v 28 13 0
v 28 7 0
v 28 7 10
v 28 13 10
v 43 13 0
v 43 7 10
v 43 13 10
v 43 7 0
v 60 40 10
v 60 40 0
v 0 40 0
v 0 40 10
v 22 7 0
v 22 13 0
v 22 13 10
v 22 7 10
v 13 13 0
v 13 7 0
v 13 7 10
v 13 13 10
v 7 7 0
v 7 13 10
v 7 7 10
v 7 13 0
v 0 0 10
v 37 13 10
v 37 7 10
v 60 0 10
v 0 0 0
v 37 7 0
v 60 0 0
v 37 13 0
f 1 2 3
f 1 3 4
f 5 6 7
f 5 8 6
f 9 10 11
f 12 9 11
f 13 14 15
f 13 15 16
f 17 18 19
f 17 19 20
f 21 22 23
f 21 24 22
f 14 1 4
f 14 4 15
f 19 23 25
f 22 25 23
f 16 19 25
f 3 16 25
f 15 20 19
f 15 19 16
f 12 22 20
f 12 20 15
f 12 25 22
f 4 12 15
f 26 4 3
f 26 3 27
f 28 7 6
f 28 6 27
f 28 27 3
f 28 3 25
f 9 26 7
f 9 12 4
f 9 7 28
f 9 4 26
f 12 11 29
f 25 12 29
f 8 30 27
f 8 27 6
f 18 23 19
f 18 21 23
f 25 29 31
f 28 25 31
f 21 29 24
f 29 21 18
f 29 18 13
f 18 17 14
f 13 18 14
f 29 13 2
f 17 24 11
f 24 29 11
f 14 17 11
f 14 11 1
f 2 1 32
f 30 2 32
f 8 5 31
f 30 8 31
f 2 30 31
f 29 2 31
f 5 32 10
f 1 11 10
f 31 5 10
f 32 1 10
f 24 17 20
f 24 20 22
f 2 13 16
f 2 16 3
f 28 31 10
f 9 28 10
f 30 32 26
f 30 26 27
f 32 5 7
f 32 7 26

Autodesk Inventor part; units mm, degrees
ref_plane "YZ Plane" through (0, 0, 0) normal (1, 0, 0) x (0, 1, 0)
ref_plane "XZ Plane" through (0, 0, 0) normal (0, 1, 0) x (-1, 0, 0)
ref_plane "XY Plane" through (0, 0, 0) normal (0, 0, 1) x (1, 0, 0)
sketch "Sketch1" plane through (0, 0, 0) normal (0, 0, 1) x (1, 0, 0)
  line L0 (0, 0) -> (60, 0)
  line L1 (60, 0) -> (60, 40)
  line L2 (60, 40) -> (0, 40)
  line L3 (0, 40) -> (0, 0)
extrude "Extrusion1" add sketch "Sketch1" along normal blind 10
sketch "Sketch2" plane through (0, 0, 0) normal (0, 0, 1) x (1, 0, 0)
  line L0 (7, 7) -> (13, 7)
  line L1 (13, 7) -> (13, 13)
  line L2 (13, 13) -> (7, 13)
  line L3 (7, 13) -> (7, 7)
extrude "Extrusion2" cut sketch "Sketch2" along normal blind 10
pattern_linear "Rectangular Pattern1" count 3 spacing 15 along (1, 0, 0) of "Extrusion2"
properties part number "21_pocket_rect"
